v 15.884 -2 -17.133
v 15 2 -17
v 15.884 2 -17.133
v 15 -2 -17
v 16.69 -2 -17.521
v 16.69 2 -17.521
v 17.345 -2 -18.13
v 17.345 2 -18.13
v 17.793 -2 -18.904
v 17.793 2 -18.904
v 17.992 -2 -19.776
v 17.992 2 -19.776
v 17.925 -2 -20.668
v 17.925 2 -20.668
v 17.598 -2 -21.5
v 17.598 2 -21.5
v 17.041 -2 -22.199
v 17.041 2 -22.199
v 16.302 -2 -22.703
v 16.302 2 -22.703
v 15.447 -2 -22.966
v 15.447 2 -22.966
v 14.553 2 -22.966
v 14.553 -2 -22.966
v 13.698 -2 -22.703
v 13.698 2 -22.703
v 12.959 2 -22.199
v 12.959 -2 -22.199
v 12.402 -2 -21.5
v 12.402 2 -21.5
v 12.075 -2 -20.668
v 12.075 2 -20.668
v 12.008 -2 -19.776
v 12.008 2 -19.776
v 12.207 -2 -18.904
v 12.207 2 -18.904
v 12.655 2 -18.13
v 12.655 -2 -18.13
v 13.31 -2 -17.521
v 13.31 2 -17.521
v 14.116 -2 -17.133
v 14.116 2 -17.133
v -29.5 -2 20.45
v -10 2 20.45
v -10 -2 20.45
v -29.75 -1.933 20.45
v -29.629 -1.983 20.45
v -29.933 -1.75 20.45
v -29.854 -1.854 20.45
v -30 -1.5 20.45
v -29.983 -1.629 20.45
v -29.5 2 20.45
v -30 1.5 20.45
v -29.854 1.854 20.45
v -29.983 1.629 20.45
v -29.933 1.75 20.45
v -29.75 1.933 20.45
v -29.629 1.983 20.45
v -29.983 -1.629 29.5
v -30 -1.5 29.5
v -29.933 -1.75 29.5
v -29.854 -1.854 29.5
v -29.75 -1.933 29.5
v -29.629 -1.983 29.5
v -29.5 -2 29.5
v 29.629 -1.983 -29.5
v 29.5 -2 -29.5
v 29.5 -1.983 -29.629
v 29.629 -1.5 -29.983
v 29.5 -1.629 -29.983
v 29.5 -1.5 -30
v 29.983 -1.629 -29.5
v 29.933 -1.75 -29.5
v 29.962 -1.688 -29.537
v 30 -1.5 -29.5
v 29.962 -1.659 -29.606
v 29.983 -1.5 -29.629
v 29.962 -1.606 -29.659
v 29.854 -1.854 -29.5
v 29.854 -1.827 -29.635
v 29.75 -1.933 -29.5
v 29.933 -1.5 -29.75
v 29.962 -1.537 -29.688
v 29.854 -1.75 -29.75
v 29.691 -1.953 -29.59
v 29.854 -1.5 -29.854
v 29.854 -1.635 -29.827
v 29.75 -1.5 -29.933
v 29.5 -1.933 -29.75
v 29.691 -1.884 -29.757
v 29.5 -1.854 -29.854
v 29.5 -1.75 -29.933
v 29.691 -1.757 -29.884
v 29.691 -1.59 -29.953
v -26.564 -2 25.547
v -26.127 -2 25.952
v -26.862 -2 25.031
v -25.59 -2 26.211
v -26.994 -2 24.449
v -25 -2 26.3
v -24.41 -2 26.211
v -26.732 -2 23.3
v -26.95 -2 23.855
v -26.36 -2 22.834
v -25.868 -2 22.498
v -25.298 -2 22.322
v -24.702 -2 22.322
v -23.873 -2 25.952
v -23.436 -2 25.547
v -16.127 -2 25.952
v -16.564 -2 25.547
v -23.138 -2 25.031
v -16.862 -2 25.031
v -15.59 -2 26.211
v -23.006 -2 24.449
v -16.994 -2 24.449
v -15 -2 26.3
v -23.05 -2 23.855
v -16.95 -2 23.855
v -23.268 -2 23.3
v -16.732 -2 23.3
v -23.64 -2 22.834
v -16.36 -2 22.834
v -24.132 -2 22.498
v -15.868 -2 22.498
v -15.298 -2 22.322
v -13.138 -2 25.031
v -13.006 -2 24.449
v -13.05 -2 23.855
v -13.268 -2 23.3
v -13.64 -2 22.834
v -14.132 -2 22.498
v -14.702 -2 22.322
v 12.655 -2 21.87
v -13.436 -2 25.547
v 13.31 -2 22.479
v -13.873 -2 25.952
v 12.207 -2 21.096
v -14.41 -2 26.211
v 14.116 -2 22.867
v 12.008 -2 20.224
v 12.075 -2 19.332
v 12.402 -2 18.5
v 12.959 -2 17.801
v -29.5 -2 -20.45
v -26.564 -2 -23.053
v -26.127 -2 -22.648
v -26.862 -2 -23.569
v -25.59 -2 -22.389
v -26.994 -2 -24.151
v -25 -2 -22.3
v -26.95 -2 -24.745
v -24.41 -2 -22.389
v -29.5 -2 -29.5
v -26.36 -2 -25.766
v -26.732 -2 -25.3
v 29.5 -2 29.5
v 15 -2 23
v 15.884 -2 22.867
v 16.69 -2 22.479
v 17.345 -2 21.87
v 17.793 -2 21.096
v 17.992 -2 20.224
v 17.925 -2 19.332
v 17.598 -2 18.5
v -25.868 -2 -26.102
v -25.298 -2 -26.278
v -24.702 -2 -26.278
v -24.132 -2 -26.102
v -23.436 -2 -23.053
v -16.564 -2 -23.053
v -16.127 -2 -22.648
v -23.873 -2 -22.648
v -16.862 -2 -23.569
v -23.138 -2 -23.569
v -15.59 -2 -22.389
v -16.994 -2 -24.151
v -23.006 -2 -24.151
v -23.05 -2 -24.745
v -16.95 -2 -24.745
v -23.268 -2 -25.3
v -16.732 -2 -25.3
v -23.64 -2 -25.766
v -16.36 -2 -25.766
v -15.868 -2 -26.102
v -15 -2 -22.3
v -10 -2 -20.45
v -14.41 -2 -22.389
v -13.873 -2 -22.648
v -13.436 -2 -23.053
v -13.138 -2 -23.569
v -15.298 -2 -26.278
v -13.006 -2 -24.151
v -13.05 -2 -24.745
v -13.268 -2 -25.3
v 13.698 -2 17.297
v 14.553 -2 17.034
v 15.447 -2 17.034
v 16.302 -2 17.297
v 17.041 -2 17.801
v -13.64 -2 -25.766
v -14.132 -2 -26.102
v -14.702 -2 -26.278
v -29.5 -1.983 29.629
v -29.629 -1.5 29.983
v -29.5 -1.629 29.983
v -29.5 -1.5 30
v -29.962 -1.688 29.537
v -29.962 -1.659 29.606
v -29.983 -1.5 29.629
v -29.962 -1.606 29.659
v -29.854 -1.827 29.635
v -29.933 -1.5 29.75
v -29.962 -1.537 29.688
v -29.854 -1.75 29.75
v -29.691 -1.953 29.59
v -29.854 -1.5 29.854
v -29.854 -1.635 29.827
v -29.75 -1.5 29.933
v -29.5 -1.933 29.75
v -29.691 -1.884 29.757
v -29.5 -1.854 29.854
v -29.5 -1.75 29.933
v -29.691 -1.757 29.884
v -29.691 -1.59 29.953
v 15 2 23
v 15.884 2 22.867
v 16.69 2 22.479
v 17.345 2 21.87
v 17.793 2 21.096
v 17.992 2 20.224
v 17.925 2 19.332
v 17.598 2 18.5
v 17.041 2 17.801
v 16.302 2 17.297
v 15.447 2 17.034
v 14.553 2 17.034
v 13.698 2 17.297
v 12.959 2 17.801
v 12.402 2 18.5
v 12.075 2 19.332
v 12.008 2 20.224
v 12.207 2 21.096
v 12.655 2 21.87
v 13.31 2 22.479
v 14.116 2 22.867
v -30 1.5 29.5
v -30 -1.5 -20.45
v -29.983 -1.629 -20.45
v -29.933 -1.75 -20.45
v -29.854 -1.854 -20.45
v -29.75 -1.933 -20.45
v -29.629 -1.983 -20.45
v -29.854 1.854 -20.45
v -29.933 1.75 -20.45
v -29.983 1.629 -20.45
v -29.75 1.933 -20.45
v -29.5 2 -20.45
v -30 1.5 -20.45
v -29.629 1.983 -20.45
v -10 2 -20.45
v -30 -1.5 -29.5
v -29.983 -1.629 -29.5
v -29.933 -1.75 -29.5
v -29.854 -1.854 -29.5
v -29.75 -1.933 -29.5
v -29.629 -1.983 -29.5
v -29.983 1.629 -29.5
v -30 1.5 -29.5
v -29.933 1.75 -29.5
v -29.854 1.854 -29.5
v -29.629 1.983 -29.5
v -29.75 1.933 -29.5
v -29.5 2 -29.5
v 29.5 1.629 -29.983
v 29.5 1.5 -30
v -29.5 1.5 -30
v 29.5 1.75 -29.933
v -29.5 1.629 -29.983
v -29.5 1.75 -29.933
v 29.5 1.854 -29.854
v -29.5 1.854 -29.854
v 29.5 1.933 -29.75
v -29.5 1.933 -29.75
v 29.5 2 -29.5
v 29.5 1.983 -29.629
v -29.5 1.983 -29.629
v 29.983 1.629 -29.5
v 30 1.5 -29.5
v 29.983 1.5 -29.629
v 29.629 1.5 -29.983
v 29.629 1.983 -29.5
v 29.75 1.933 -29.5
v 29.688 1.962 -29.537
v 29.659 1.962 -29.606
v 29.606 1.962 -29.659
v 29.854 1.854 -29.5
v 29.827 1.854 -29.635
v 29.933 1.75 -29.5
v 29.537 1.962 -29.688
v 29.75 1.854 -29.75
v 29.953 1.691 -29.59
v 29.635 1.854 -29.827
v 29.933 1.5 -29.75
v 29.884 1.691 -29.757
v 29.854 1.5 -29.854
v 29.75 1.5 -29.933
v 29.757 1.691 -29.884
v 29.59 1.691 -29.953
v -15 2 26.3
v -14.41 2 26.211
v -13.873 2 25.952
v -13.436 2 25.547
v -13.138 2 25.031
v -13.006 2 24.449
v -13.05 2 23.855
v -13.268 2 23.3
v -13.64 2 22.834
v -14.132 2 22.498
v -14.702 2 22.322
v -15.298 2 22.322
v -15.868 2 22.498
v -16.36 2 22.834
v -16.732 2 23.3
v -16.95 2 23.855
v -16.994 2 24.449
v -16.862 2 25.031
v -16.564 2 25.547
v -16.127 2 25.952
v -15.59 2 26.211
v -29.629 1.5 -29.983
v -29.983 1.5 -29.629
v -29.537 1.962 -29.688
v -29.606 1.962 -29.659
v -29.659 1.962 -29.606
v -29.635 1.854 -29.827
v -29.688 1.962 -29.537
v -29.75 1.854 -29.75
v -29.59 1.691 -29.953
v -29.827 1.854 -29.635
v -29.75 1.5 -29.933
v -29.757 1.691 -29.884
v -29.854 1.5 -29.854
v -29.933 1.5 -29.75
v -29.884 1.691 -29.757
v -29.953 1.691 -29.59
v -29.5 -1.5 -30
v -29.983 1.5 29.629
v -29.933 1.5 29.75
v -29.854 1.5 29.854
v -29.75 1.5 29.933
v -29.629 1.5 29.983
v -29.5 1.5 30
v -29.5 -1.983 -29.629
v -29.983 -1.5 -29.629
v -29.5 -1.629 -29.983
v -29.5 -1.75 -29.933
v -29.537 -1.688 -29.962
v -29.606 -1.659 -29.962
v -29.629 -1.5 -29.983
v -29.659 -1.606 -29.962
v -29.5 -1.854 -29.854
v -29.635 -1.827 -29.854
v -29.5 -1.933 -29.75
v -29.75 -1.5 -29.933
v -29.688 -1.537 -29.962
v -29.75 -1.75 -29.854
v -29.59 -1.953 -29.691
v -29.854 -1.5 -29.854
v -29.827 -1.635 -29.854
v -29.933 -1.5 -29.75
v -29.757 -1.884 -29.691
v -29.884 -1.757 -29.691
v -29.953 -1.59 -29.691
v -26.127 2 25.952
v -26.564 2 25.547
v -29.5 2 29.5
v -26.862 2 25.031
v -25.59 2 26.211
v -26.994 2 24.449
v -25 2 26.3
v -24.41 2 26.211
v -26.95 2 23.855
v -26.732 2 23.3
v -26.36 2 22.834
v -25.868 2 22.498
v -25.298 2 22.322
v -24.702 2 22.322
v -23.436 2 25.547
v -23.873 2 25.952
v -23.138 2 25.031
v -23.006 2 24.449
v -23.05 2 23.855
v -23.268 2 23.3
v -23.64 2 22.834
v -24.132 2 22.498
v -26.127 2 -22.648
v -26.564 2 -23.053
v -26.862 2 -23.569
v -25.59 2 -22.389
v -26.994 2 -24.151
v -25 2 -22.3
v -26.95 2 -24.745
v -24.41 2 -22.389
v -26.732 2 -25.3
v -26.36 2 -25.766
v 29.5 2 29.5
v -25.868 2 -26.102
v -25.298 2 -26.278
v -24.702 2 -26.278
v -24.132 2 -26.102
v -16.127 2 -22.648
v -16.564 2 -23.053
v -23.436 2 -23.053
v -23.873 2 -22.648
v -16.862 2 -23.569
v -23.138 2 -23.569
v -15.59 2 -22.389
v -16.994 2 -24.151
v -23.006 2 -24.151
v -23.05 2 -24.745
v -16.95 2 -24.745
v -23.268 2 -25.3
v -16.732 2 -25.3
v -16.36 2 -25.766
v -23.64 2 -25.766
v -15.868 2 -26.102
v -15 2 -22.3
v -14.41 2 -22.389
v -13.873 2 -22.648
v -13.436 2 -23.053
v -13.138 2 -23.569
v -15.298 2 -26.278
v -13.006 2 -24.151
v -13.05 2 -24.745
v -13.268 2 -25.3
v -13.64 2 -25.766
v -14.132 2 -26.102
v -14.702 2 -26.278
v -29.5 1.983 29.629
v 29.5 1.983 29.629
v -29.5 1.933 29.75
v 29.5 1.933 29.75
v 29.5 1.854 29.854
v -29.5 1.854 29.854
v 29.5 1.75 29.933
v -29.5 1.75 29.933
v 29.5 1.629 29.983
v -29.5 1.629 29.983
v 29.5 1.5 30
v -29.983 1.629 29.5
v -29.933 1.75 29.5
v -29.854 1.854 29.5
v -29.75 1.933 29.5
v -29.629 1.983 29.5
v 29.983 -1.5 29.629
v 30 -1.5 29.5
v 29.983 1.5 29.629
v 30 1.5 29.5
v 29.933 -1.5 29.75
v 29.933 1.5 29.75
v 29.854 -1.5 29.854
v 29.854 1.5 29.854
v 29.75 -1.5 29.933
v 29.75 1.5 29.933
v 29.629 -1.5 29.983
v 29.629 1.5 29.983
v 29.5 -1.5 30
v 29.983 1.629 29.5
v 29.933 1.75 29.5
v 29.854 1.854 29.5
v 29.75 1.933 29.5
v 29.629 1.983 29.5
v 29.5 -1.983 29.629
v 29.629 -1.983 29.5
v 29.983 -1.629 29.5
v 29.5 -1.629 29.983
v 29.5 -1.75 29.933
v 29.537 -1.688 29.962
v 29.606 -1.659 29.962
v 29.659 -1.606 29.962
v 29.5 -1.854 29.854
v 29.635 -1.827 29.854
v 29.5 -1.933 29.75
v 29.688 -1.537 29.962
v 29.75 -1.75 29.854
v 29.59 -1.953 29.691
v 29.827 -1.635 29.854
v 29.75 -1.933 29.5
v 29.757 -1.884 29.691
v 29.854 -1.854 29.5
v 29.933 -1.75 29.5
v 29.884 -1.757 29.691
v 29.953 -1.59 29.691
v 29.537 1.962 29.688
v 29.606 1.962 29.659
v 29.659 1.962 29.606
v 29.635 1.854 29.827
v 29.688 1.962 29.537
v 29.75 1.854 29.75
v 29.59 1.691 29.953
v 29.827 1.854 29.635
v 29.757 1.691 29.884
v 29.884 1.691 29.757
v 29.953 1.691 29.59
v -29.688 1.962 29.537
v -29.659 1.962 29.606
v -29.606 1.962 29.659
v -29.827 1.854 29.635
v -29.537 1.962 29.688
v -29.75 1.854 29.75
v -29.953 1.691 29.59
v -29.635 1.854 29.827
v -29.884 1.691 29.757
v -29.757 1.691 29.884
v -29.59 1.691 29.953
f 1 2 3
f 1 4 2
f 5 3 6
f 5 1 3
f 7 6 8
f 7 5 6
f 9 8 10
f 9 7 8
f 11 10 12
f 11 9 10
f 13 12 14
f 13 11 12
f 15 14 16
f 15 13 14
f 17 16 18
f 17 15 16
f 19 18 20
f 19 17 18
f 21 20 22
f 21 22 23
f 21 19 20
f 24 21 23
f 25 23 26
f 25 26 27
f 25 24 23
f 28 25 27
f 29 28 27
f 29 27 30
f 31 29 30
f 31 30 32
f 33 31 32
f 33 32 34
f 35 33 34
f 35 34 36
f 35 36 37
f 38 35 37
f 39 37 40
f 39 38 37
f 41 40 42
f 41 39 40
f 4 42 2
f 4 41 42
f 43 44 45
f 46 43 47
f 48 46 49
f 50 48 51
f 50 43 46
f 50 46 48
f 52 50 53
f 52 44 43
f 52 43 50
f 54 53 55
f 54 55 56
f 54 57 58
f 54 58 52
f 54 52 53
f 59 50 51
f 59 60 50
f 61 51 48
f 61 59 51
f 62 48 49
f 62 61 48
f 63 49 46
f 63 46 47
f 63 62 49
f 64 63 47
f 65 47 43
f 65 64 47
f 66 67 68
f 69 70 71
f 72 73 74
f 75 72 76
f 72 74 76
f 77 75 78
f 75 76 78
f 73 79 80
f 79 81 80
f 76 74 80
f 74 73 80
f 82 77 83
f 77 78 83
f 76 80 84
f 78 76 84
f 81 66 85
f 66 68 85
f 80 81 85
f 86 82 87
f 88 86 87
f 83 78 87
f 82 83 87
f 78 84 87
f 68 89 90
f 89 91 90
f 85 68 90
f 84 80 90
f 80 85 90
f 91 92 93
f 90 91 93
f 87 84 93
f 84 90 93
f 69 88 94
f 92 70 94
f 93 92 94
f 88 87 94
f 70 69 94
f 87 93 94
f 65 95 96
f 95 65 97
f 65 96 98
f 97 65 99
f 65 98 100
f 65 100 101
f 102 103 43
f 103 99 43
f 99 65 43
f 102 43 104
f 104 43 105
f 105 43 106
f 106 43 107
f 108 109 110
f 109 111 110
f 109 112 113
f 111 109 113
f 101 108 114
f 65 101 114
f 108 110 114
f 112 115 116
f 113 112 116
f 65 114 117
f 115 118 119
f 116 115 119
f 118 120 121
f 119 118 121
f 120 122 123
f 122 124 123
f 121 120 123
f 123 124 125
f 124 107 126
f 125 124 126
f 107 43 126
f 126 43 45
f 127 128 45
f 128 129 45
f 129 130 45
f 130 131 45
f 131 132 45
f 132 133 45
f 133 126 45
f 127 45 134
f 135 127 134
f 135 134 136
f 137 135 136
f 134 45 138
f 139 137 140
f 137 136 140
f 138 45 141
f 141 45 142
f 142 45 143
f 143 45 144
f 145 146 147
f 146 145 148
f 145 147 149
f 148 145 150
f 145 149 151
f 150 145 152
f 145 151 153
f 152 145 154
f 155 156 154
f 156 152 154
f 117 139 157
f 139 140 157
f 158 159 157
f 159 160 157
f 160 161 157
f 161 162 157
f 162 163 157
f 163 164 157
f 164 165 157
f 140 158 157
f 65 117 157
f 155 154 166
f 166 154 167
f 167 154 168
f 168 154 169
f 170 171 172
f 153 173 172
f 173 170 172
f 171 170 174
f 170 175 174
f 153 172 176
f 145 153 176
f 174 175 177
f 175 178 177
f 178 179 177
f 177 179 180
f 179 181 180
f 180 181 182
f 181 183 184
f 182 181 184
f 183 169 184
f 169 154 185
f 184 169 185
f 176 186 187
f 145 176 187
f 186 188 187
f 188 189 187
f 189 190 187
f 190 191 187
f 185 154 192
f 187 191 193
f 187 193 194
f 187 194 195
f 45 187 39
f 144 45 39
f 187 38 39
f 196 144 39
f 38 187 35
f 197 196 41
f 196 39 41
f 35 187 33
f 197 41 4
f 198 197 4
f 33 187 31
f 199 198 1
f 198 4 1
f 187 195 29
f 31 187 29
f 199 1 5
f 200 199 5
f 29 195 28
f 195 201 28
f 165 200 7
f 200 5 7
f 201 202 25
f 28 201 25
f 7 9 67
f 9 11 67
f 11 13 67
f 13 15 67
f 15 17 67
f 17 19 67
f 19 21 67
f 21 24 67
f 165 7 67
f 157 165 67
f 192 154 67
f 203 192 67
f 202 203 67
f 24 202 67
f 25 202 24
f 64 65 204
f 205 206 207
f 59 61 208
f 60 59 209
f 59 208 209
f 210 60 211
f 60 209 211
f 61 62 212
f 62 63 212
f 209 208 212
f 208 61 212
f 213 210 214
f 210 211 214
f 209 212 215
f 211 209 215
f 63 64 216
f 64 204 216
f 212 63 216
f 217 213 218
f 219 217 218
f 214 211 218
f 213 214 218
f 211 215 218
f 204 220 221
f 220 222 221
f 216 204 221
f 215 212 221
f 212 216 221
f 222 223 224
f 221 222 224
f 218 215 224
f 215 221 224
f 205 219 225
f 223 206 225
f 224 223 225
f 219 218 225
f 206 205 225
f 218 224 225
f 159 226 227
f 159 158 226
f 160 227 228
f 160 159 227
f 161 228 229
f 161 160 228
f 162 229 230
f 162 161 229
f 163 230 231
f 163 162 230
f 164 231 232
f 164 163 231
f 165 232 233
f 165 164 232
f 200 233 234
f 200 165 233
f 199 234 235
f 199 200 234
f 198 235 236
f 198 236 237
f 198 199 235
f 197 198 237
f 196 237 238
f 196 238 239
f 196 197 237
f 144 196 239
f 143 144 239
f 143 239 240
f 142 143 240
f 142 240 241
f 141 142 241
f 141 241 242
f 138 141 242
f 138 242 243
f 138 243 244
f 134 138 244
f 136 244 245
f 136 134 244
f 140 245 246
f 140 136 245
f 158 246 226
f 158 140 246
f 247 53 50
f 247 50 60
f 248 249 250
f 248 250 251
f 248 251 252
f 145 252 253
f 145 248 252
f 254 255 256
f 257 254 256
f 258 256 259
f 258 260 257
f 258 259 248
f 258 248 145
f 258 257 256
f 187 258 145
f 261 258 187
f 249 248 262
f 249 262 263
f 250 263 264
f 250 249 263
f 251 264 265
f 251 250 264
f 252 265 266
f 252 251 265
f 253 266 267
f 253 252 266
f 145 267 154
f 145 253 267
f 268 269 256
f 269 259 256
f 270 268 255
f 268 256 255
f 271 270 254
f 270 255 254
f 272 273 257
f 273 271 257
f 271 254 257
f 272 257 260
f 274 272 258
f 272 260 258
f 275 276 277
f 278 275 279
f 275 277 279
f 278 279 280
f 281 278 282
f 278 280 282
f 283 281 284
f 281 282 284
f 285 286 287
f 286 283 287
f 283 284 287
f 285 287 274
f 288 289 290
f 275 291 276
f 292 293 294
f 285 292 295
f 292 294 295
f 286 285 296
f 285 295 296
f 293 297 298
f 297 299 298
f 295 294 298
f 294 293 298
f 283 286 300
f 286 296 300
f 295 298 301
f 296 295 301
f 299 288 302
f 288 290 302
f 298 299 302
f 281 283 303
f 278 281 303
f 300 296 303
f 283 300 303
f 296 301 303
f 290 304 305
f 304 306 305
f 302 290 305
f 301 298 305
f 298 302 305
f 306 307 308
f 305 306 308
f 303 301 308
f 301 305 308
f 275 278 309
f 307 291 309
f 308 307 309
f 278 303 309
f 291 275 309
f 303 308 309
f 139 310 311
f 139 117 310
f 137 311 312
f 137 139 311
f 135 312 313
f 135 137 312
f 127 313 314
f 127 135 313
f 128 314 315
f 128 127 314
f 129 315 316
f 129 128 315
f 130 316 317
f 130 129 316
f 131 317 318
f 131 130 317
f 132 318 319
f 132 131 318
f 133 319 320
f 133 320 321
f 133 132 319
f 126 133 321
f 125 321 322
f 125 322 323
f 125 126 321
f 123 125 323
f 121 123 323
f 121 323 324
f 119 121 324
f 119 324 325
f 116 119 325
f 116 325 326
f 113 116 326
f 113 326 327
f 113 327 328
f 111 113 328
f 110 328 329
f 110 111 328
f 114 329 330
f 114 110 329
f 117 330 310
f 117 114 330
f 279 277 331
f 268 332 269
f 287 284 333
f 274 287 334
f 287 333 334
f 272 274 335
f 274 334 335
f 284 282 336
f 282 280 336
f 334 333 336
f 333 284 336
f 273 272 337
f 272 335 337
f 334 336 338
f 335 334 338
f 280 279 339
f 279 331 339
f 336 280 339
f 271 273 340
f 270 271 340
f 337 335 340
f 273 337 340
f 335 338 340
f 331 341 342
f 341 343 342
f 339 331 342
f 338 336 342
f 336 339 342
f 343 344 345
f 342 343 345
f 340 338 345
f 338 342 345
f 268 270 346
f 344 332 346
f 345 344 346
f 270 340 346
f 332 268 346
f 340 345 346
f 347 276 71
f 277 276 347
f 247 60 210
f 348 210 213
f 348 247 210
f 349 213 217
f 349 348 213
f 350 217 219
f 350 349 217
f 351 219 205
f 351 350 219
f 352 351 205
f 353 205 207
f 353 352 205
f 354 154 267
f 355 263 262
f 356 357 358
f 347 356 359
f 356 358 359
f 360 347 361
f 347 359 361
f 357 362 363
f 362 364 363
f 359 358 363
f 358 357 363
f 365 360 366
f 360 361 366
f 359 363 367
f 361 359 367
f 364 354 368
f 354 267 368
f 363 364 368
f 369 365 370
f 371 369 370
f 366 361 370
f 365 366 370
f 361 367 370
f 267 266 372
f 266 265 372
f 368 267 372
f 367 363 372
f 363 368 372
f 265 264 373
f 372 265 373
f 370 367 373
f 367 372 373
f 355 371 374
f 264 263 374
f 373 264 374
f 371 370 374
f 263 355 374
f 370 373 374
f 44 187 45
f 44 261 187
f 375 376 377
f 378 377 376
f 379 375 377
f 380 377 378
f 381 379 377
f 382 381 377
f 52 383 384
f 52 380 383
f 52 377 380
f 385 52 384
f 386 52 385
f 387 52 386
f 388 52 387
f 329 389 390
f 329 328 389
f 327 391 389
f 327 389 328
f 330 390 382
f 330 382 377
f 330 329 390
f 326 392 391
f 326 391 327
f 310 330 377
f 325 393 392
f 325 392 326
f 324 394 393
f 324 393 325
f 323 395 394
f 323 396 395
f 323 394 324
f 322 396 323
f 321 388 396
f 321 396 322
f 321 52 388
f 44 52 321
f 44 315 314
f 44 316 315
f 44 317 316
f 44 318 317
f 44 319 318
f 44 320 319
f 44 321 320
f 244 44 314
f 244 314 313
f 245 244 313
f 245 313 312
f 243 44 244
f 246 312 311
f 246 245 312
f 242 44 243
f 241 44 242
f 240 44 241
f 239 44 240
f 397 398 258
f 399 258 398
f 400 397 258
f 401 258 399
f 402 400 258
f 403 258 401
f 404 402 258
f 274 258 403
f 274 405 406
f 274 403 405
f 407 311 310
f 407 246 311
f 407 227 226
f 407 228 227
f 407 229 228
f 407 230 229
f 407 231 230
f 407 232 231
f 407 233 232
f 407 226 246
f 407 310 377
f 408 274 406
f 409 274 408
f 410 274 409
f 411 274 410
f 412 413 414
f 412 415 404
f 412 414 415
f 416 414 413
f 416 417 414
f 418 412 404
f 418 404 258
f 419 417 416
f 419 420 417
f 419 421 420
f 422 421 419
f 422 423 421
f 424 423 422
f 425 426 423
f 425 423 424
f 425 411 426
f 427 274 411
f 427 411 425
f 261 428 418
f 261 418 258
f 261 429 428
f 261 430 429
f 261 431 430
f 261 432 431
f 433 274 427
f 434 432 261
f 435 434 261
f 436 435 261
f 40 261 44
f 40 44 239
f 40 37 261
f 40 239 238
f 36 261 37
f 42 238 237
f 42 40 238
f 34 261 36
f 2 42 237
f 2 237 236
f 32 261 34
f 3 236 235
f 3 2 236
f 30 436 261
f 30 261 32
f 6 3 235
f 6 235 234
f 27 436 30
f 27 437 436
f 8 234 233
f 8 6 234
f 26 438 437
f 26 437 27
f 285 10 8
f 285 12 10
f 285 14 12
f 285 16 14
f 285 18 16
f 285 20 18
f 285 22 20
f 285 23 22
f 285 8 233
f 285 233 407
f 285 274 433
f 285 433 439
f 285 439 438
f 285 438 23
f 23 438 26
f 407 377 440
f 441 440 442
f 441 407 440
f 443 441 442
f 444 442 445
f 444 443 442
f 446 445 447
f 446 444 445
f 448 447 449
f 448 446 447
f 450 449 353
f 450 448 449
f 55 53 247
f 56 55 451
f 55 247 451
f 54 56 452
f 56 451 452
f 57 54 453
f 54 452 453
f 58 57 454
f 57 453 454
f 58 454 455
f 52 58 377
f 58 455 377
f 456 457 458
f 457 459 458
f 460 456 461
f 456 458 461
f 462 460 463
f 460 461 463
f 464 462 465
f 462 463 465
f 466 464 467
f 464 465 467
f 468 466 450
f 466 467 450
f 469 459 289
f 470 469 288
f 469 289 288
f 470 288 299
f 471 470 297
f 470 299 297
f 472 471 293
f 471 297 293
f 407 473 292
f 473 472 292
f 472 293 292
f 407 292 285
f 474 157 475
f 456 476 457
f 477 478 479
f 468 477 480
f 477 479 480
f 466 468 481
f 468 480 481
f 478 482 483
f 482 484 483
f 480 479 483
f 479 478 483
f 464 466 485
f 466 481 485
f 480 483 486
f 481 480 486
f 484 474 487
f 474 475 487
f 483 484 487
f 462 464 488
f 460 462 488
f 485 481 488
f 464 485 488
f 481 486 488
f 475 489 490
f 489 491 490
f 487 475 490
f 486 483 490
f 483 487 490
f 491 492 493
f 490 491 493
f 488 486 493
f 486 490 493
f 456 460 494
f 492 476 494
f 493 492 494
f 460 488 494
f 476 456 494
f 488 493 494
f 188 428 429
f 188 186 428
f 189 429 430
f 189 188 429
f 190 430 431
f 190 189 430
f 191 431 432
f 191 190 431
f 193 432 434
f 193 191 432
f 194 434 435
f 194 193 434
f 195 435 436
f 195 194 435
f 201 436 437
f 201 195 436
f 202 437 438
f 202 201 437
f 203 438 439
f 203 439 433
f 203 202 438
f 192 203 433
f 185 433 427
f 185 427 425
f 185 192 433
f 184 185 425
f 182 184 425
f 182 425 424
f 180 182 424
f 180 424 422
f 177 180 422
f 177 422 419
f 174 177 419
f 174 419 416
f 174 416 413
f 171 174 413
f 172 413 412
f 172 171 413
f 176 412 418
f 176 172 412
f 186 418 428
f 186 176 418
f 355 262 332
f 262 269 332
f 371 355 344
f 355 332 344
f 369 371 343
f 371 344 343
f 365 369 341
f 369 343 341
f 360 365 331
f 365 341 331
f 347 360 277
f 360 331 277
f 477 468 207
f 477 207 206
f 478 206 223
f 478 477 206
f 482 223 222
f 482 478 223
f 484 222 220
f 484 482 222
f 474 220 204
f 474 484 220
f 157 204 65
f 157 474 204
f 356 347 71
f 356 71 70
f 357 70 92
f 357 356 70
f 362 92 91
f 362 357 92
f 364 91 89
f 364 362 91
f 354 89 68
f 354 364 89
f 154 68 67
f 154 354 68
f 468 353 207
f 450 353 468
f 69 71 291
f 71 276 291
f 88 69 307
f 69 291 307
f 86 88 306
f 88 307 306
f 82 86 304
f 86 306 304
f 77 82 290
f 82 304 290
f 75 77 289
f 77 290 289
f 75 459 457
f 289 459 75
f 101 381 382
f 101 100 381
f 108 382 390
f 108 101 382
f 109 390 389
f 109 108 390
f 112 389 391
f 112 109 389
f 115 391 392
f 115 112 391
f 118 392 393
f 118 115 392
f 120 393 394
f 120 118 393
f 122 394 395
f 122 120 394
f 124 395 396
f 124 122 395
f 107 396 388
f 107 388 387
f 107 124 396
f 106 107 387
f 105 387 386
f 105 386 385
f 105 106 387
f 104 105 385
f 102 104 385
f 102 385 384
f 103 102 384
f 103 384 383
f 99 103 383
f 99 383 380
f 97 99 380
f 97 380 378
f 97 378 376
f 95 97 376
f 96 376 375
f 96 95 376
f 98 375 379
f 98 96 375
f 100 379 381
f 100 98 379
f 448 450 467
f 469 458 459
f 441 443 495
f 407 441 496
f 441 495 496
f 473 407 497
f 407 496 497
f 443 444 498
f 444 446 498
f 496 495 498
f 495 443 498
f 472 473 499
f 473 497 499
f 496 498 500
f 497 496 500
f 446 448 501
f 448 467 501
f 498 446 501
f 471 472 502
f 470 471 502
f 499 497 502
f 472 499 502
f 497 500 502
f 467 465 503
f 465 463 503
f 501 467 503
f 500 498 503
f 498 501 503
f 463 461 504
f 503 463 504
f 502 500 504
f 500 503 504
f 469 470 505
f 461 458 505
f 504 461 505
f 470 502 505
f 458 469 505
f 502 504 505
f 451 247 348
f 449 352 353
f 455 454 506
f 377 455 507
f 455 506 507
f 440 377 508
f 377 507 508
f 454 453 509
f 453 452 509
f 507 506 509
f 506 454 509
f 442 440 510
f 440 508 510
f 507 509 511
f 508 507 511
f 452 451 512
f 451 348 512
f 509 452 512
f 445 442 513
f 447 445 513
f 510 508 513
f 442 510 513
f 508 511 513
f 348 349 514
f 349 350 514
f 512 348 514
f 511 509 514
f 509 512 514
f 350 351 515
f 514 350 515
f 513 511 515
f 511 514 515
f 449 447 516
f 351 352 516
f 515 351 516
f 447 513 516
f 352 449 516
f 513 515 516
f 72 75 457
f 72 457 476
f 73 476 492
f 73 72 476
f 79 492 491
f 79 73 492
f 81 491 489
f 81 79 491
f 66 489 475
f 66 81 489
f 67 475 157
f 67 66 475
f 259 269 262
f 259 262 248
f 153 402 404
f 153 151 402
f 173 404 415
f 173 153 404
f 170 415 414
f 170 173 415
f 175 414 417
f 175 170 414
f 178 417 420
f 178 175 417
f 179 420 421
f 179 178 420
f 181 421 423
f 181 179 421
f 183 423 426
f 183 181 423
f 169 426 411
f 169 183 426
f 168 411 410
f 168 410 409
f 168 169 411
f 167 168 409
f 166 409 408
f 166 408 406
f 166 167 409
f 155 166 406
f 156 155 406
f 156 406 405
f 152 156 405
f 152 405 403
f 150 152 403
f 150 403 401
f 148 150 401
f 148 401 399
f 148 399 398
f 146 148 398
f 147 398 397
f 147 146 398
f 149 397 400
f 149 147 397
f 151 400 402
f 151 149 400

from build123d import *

# Parameters (mm, degrees)
SKETCH1_R           = 2
SKETCH1_R_2         = 3
BOSS_EXTRUDE1_DEPTH = 2
FILLET1_R           = 0.5


with BuildPart() as part:
    # Sketch1 → Boss-Extrude1 (new, symmetric)
    with BuildSketch(Plane(origin=(0, 0, 0), x_dir=(1, 0, 0), z_dir=(0, 1, 0))):
        Polygon((-30, -20.45), (-30, -30), (30, -30), (30, 30), (-30, 30), (-30, 20.45), (-10, 20.45), (-10, -20.45), align=None)
        with Locations((-25, -24.3)):
            Circle(SKETCH1_R, mode=Mode.SUBTRACT)
        with Locations((-15, -24.3)):
            Circle(SKETCH1_R, mode=Mode.SUBTRACT)
        with Locations((15, -20)):
            Circle(SKETCH1_R_2, mode=Mode.SUBTRACT)
        with Locations((-25, 24.3)):
            Circle(SKETCH1_R, mode=Mode.SUBTRACT)
        with Locations((-15, 24.3)):
            Circle(SKETCH1_R, mode=Mode.SUBTRACT)
        with Locations((15, 20)):
            Circle(SKETCH1_R_2, mode=Mode.SUBTRACT)
    extrude(amount=BOSS_EXTRUDE1_DEPTH, both=True)

    # Fillet1
    fillet1_edges = [part.edges().sort_by_distance(p)[0] for p in [
        (30, 2, 0),
        (30, -2, 0),
        (-30, 0, 30),
        (0, 2, 30),
        (30, 0, 30),
        (0, -2, 30),
        (30, 0, -30),
        (0, 2, -30),
        (-30, 0, -30),
        (0, -2, -30),
        (-30, -2, 25.225),
        (-30, 2, 25.225),
        (-30, -2, -25.225),
        (-30, 2, -25.225),
    ]]
    fillet(fillet1_edges, radius=FILLET1_R)


solid = part.part
